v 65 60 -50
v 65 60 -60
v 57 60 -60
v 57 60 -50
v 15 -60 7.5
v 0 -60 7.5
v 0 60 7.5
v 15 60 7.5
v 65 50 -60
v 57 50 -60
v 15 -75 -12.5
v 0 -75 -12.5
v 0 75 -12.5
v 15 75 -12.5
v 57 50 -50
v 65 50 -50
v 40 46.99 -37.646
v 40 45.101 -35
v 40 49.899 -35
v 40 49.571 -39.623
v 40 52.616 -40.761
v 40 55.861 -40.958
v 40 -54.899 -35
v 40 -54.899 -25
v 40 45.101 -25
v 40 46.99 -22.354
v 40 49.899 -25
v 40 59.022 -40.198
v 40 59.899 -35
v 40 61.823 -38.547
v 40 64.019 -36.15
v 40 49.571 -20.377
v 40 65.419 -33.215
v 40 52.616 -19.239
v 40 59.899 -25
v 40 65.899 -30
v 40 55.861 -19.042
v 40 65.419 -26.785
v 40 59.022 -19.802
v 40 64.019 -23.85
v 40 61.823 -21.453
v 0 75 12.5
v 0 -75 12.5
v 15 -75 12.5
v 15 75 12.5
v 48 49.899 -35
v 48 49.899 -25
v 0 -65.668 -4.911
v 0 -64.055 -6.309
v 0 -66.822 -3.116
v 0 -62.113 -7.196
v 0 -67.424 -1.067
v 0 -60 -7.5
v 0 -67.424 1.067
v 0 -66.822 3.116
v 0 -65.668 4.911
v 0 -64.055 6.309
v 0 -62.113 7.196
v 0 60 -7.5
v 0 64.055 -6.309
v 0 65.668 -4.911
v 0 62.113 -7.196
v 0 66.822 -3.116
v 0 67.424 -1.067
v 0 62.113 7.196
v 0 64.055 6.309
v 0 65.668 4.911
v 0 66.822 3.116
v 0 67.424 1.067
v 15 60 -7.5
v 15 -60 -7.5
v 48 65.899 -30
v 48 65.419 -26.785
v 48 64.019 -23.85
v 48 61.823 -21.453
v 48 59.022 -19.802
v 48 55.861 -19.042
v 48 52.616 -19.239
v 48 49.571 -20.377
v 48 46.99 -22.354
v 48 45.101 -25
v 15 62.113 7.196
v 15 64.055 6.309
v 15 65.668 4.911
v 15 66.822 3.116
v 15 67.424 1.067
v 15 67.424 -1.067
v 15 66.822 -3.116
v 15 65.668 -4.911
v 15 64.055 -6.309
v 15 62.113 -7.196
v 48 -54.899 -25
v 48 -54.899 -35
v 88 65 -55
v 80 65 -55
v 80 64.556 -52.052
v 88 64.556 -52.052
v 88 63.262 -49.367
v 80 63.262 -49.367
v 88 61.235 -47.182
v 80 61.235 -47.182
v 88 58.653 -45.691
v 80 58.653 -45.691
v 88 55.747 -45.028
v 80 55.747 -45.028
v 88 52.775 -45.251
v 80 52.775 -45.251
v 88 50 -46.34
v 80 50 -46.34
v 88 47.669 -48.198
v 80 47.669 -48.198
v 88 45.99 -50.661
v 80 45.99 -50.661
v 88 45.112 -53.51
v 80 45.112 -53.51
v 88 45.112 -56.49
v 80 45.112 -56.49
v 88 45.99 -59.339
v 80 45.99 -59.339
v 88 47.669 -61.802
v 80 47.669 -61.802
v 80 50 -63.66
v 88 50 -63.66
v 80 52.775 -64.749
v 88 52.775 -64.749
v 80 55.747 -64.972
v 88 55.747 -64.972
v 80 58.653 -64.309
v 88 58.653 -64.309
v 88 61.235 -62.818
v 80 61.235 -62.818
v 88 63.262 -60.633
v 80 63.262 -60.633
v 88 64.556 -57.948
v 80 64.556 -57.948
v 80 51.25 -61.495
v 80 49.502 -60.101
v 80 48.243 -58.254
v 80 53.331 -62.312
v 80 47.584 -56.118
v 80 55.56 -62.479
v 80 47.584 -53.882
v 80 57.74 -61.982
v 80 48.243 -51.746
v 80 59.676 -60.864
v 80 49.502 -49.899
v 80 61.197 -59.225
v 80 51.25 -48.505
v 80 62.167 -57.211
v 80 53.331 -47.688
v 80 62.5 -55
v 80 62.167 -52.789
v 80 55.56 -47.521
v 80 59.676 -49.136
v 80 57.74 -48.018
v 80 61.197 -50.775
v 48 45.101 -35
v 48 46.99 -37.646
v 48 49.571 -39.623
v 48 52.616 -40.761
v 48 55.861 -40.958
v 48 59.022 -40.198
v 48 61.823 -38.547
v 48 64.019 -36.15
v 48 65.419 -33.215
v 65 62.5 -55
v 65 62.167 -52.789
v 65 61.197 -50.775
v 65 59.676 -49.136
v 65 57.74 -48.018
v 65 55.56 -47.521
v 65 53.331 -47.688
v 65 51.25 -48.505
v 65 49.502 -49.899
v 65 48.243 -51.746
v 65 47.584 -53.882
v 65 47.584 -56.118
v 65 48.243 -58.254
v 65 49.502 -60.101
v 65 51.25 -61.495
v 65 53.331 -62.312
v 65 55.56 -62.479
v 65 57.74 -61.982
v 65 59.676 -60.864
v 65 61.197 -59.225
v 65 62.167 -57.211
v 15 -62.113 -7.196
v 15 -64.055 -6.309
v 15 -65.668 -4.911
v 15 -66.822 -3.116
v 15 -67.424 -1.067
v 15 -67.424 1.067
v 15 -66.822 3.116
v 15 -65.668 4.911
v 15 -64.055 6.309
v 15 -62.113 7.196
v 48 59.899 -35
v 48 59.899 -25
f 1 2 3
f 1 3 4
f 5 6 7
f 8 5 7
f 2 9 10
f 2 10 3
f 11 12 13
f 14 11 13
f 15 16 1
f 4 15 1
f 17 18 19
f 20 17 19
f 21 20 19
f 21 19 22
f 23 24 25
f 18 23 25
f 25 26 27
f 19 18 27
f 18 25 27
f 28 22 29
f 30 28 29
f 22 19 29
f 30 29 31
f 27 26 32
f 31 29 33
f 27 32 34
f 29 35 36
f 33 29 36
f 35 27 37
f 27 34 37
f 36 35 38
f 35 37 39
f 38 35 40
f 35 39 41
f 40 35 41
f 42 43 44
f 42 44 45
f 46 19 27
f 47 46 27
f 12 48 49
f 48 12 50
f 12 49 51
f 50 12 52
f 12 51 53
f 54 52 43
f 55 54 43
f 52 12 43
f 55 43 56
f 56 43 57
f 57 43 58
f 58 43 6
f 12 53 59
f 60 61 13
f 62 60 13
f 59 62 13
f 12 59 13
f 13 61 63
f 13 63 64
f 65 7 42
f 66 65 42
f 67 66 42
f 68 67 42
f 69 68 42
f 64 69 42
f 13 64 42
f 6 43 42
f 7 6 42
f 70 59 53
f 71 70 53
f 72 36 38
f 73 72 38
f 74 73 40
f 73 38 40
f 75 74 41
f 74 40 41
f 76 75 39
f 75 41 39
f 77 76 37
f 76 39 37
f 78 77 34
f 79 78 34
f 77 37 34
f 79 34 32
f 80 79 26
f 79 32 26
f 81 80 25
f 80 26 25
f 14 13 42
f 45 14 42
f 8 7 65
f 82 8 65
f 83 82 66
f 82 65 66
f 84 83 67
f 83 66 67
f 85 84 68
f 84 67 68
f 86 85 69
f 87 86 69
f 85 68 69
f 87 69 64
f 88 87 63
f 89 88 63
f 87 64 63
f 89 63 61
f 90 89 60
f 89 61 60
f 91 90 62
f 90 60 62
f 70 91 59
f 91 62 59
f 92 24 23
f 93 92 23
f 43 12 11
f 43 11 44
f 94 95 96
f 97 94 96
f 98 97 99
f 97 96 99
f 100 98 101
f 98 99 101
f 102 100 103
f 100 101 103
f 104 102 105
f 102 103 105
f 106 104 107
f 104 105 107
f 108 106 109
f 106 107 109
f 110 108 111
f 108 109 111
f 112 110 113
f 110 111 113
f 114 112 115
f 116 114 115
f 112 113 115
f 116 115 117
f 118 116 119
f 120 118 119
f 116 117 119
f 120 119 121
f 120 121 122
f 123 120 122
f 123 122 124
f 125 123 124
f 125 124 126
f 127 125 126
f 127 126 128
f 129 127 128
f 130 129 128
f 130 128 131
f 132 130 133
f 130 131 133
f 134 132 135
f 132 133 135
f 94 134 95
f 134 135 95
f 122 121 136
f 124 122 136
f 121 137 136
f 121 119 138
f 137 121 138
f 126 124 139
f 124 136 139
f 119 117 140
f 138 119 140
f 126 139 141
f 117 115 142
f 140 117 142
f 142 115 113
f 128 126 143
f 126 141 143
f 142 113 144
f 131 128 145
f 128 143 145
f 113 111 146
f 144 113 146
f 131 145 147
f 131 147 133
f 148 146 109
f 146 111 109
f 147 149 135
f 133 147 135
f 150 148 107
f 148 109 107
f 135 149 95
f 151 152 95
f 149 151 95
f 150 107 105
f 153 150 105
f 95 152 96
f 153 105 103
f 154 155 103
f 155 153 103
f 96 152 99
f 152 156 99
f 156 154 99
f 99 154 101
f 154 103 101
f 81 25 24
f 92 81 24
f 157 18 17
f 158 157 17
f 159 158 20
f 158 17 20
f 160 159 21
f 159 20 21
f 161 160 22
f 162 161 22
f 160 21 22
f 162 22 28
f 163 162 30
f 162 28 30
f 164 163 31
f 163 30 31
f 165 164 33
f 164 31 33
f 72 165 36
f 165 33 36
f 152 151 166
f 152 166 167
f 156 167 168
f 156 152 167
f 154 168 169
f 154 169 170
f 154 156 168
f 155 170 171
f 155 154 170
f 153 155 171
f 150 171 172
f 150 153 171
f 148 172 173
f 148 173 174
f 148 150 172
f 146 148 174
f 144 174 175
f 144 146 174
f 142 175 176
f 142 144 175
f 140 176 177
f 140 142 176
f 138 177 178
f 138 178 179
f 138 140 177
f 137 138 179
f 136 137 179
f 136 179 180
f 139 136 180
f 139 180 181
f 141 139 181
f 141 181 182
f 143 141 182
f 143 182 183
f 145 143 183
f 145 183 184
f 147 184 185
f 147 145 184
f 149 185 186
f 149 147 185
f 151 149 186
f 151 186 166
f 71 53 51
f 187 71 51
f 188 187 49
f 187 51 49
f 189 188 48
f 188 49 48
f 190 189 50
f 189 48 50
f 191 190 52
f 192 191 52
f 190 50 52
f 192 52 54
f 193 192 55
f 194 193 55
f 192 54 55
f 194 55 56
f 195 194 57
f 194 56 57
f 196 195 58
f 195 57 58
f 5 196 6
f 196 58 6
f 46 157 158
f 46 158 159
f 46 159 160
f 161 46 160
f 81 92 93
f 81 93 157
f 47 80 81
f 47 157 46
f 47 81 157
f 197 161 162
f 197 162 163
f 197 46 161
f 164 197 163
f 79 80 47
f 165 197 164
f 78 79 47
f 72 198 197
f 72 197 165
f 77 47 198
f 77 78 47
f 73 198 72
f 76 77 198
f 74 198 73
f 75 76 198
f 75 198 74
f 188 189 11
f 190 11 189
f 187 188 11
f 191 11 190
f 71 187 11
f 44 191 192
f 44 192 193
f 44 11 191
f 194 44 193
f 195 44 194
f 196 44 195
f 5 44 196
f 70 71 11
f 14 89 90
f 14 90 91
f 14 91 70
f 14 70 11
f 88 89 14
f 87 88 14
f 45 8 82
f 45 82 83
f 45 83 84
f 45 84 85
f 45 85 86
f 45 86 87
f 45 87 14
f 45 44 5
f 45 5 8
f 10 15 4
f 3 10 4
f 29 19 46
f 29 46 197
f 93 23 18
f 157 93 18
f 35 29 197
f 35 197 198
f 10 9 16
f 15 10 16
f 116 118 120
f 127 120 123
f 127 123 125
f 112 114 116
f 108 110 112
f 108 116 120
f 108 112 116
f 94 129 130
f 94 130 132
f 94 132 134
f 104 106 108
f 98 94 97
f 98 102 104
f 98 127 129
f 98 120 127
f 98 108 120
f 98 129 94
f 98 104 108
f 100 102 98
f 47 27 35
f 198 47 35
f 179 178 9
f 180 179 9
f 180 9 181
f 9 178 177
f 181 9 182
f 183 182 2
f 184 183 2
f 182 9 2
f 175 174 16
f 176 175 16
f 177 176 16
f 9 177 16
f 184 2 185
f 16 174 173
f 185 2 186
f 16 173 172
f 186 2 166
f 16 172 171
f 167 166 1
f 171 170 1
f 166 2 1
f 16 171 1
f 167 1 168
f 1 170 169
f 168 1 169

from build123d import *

# Parameters (mm, degrees)
F0_W     = 150
F0_H     = 25
F1_DEPTH = 15
F3_W     = 10
F3_H     = 10
F4_DEPTH = 8
F6_R     = 10
F6_R_2   = 7.5
F6_W     = 10
F6_H     = 10
F7_DEPTH = 8
F8_DEPTH = 15
F9_DEPTH = 23


with BuildPart() as f1:
    # F0 (on Right) → F1 (new body)
    with BuildSketch(Plane.YZ):
        Rectangle(F0_W, F0_H)
        with BuildLine():
            Line((-60, 7.5), (60, 7.5))
            ThreePointArc((60, 7.5), (67.5, 0), (60, -7.5))
            Line((60, -7.5), (-60, -7.5))
            ThreePointArc((-60, -7.5), (-67.5, 0), (-60, 7.5))
        make_face(mode=Mode.SUBTRACT)
    extrude(amount=F1_DEPTH)


with BuildPart() as f4:
    # F3 (on offset) → F4 (new body)
    with BuildSketch(Plane.YZ.offset(40)):
        with BuildLine():
            ThreePointArc((45.1010205144, -35), (43.8989794856, -30), (45.1010205144, -25))
            Line((45.1010205144, -25), (-54.8989794856, -25))
            Line((-54.8989794856, -25), (-54.8989794856, -35))
            Line((-54.8989794856, -35), (45.1010205144, -35))
        make_face()
        with BuildLine():
            ThreePointArc((65.8989794856, -30), (57.470209864, -19.304731217), (45.1010205144, -25))
            ThreePointArc((45.1010205144, -25), (43.8989794856, -30), (45.1010205144, -35))
            ThreePointArc((45.1010205144, -35), (57.470209864, -40.695268783), (65.8989794856, -30))
        make_face()
        with Locations((54.8989794856, -30)):
            Rectangle(F3_W, F3_H, mode=Mode.SUBTRACT)
    extrude(amount=F4_DEPTH)


with BuildPart() as f7:
    # F6 (on offset) → F7 (new body)
    with BuildSketch(Plane.YZ.offset(80)):
        with Locations((55, -55)):
            Circle(F6_R)
        with Locations((55, -55)):
            Circle(F6_R_2, mode=Mode.SUBTRACT)
        with Locations((55, -55)):
            Circle(F6_R_2)
        with Locations((55, -55)):
            Rectangle(F6_W, F6_H, mode=Mode.SUBTRACT)
        with Locations((55, -55)):
            Rectangle(F6_W, F6_H)
    extrude(amount=F7_DEPTH)

    # F6 (on offset) → F8 (join)
    with BuildSketch(Plane.YZ.offset(80)):
        with Locations((55, -55)):
            Circle(F6_R_2)
        with Locations((55, -55)):
            Rectangle(F6_W, F6_H, mode=Mode.SUBTRACT)
        with Locations((55, -55)):
            Rectangle(F6_W, F6_H)
    extrude(amount=-F8_DEPTH)

    # F6 (on offset) → F9 (join)
    with BuildSketch(Plane.YZ.offset(80)):
        with Locations((55, -55)):
            Rectangle(F6_W, F6_H)
    extrude(amount=-F9_DEPTH)


solid = Compound([f1.part, f4.part, f7.part])
